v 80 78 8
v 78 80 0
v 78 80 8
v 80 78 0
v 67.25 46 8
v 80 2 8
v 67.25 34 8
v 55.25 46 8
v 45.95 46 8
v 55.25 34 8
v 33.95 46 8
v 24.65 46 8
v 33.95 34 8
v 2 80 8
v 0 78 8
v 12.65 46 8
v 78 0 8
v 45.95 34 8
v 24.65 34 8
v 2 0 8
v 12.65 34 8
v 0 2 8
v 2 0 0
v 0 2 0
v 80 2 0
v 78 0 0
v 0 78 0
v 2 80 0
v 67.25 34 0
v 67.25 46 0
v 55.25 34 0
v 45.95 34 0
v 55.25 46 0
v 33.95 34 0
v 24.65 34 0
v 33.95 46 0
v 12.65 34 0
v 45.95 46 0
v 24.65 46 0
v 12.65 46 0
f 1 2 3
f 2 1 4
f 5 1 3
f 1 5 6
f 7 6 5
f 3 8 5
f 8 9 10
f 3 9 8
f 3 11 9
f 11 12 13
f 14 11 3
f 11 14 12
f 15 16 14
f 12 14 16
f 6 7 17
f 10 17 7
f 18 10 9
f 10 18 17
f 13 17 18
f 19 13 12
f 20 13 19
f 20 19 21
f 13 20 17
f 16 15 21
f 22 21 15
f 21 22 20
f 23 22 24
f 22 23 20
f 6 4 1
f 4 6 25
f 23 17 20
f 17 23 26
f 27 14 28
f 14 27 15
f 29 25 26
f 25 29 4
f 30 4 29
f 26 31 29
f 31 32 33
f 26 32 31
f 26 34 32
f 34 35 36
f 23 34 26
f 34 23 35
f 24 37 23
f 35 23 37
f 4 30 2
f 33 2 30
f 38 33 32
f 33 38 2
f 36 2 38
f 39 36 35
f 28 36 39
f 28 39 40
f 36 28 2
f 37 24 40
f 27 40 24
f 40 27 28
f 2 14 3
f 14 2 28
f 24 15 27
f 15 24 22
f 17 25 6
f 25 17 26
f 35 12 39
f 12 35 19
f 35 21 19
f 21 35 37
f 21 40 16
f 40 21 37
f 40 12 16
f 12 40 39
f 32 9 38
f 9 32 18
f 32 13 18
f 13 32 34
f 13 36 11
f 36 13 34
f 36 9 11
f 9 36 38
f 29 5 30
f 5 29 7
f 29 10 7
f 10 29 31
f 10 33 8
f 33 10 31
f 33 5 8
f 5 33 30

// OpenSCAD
$fn = 32;

// ----------------------------------------------------------------------
// Windowed plate: 3 voids, 80 x 80 x 8 mm
// ----------------------------------------------------------------------

// --- parameters (mm) ---
plate_l = 80;             // plate length, X
plate_w = 80;             // plate width, Y
plate_t = 8;              // plate thickness, Z
edge_margin = 8;          // wall from the plate edge to any window
windows = 3;              // number of windows in the row
win_l = 12;               // window length
win_w = 12;               // window width
win_pitch = 21.3;         // window pitch along X
depth_1 = 8;              // depth of void 1 (full thickness = through)
depth_2 = 8;              // depth of void 2 (full thickness = through)
depth_3 = 8;              // depth of void 3 (full thickness = through)
corner_c = 2;             // corner chamfer of the plate

profile = [[2, 0], [78, 0], [80, 2], [80, 78], [78, 80], [2, 80], [0, 78], [0, 2]];  // primary outline, 8 points, counter clockwise
void_1 = [[12.65, 34], [24.65, 34], [24.65, 46], [12.65, 46]];  // window 1 of the row, 4 points
void_2 = [[33.95, 34], [45.95, 34], [45.95, 46], [33.95, 46]];  // window 2 of the row, 4 points
void_3 = [[55.25, 34], [67.25, 34], [67.25, 46], [55.25, 46]];  // window 3 of the row, 4 points

// --- the one profile operation ---
difference() {
  linear_extrude(height = plate_t) polygon(points = profile);
  translate([0, 0, -1])
    linear_extrude(height = plate_t + 2) polygon(points = void_1);
  translate([0, 0, -1])
    linear_extrude(height = plate_t + 2) polygon(points = void_2);
  translate([0, 0, -1])
    linear_extrude(height = plate_t + 2) polygon(points = void_3);
}
